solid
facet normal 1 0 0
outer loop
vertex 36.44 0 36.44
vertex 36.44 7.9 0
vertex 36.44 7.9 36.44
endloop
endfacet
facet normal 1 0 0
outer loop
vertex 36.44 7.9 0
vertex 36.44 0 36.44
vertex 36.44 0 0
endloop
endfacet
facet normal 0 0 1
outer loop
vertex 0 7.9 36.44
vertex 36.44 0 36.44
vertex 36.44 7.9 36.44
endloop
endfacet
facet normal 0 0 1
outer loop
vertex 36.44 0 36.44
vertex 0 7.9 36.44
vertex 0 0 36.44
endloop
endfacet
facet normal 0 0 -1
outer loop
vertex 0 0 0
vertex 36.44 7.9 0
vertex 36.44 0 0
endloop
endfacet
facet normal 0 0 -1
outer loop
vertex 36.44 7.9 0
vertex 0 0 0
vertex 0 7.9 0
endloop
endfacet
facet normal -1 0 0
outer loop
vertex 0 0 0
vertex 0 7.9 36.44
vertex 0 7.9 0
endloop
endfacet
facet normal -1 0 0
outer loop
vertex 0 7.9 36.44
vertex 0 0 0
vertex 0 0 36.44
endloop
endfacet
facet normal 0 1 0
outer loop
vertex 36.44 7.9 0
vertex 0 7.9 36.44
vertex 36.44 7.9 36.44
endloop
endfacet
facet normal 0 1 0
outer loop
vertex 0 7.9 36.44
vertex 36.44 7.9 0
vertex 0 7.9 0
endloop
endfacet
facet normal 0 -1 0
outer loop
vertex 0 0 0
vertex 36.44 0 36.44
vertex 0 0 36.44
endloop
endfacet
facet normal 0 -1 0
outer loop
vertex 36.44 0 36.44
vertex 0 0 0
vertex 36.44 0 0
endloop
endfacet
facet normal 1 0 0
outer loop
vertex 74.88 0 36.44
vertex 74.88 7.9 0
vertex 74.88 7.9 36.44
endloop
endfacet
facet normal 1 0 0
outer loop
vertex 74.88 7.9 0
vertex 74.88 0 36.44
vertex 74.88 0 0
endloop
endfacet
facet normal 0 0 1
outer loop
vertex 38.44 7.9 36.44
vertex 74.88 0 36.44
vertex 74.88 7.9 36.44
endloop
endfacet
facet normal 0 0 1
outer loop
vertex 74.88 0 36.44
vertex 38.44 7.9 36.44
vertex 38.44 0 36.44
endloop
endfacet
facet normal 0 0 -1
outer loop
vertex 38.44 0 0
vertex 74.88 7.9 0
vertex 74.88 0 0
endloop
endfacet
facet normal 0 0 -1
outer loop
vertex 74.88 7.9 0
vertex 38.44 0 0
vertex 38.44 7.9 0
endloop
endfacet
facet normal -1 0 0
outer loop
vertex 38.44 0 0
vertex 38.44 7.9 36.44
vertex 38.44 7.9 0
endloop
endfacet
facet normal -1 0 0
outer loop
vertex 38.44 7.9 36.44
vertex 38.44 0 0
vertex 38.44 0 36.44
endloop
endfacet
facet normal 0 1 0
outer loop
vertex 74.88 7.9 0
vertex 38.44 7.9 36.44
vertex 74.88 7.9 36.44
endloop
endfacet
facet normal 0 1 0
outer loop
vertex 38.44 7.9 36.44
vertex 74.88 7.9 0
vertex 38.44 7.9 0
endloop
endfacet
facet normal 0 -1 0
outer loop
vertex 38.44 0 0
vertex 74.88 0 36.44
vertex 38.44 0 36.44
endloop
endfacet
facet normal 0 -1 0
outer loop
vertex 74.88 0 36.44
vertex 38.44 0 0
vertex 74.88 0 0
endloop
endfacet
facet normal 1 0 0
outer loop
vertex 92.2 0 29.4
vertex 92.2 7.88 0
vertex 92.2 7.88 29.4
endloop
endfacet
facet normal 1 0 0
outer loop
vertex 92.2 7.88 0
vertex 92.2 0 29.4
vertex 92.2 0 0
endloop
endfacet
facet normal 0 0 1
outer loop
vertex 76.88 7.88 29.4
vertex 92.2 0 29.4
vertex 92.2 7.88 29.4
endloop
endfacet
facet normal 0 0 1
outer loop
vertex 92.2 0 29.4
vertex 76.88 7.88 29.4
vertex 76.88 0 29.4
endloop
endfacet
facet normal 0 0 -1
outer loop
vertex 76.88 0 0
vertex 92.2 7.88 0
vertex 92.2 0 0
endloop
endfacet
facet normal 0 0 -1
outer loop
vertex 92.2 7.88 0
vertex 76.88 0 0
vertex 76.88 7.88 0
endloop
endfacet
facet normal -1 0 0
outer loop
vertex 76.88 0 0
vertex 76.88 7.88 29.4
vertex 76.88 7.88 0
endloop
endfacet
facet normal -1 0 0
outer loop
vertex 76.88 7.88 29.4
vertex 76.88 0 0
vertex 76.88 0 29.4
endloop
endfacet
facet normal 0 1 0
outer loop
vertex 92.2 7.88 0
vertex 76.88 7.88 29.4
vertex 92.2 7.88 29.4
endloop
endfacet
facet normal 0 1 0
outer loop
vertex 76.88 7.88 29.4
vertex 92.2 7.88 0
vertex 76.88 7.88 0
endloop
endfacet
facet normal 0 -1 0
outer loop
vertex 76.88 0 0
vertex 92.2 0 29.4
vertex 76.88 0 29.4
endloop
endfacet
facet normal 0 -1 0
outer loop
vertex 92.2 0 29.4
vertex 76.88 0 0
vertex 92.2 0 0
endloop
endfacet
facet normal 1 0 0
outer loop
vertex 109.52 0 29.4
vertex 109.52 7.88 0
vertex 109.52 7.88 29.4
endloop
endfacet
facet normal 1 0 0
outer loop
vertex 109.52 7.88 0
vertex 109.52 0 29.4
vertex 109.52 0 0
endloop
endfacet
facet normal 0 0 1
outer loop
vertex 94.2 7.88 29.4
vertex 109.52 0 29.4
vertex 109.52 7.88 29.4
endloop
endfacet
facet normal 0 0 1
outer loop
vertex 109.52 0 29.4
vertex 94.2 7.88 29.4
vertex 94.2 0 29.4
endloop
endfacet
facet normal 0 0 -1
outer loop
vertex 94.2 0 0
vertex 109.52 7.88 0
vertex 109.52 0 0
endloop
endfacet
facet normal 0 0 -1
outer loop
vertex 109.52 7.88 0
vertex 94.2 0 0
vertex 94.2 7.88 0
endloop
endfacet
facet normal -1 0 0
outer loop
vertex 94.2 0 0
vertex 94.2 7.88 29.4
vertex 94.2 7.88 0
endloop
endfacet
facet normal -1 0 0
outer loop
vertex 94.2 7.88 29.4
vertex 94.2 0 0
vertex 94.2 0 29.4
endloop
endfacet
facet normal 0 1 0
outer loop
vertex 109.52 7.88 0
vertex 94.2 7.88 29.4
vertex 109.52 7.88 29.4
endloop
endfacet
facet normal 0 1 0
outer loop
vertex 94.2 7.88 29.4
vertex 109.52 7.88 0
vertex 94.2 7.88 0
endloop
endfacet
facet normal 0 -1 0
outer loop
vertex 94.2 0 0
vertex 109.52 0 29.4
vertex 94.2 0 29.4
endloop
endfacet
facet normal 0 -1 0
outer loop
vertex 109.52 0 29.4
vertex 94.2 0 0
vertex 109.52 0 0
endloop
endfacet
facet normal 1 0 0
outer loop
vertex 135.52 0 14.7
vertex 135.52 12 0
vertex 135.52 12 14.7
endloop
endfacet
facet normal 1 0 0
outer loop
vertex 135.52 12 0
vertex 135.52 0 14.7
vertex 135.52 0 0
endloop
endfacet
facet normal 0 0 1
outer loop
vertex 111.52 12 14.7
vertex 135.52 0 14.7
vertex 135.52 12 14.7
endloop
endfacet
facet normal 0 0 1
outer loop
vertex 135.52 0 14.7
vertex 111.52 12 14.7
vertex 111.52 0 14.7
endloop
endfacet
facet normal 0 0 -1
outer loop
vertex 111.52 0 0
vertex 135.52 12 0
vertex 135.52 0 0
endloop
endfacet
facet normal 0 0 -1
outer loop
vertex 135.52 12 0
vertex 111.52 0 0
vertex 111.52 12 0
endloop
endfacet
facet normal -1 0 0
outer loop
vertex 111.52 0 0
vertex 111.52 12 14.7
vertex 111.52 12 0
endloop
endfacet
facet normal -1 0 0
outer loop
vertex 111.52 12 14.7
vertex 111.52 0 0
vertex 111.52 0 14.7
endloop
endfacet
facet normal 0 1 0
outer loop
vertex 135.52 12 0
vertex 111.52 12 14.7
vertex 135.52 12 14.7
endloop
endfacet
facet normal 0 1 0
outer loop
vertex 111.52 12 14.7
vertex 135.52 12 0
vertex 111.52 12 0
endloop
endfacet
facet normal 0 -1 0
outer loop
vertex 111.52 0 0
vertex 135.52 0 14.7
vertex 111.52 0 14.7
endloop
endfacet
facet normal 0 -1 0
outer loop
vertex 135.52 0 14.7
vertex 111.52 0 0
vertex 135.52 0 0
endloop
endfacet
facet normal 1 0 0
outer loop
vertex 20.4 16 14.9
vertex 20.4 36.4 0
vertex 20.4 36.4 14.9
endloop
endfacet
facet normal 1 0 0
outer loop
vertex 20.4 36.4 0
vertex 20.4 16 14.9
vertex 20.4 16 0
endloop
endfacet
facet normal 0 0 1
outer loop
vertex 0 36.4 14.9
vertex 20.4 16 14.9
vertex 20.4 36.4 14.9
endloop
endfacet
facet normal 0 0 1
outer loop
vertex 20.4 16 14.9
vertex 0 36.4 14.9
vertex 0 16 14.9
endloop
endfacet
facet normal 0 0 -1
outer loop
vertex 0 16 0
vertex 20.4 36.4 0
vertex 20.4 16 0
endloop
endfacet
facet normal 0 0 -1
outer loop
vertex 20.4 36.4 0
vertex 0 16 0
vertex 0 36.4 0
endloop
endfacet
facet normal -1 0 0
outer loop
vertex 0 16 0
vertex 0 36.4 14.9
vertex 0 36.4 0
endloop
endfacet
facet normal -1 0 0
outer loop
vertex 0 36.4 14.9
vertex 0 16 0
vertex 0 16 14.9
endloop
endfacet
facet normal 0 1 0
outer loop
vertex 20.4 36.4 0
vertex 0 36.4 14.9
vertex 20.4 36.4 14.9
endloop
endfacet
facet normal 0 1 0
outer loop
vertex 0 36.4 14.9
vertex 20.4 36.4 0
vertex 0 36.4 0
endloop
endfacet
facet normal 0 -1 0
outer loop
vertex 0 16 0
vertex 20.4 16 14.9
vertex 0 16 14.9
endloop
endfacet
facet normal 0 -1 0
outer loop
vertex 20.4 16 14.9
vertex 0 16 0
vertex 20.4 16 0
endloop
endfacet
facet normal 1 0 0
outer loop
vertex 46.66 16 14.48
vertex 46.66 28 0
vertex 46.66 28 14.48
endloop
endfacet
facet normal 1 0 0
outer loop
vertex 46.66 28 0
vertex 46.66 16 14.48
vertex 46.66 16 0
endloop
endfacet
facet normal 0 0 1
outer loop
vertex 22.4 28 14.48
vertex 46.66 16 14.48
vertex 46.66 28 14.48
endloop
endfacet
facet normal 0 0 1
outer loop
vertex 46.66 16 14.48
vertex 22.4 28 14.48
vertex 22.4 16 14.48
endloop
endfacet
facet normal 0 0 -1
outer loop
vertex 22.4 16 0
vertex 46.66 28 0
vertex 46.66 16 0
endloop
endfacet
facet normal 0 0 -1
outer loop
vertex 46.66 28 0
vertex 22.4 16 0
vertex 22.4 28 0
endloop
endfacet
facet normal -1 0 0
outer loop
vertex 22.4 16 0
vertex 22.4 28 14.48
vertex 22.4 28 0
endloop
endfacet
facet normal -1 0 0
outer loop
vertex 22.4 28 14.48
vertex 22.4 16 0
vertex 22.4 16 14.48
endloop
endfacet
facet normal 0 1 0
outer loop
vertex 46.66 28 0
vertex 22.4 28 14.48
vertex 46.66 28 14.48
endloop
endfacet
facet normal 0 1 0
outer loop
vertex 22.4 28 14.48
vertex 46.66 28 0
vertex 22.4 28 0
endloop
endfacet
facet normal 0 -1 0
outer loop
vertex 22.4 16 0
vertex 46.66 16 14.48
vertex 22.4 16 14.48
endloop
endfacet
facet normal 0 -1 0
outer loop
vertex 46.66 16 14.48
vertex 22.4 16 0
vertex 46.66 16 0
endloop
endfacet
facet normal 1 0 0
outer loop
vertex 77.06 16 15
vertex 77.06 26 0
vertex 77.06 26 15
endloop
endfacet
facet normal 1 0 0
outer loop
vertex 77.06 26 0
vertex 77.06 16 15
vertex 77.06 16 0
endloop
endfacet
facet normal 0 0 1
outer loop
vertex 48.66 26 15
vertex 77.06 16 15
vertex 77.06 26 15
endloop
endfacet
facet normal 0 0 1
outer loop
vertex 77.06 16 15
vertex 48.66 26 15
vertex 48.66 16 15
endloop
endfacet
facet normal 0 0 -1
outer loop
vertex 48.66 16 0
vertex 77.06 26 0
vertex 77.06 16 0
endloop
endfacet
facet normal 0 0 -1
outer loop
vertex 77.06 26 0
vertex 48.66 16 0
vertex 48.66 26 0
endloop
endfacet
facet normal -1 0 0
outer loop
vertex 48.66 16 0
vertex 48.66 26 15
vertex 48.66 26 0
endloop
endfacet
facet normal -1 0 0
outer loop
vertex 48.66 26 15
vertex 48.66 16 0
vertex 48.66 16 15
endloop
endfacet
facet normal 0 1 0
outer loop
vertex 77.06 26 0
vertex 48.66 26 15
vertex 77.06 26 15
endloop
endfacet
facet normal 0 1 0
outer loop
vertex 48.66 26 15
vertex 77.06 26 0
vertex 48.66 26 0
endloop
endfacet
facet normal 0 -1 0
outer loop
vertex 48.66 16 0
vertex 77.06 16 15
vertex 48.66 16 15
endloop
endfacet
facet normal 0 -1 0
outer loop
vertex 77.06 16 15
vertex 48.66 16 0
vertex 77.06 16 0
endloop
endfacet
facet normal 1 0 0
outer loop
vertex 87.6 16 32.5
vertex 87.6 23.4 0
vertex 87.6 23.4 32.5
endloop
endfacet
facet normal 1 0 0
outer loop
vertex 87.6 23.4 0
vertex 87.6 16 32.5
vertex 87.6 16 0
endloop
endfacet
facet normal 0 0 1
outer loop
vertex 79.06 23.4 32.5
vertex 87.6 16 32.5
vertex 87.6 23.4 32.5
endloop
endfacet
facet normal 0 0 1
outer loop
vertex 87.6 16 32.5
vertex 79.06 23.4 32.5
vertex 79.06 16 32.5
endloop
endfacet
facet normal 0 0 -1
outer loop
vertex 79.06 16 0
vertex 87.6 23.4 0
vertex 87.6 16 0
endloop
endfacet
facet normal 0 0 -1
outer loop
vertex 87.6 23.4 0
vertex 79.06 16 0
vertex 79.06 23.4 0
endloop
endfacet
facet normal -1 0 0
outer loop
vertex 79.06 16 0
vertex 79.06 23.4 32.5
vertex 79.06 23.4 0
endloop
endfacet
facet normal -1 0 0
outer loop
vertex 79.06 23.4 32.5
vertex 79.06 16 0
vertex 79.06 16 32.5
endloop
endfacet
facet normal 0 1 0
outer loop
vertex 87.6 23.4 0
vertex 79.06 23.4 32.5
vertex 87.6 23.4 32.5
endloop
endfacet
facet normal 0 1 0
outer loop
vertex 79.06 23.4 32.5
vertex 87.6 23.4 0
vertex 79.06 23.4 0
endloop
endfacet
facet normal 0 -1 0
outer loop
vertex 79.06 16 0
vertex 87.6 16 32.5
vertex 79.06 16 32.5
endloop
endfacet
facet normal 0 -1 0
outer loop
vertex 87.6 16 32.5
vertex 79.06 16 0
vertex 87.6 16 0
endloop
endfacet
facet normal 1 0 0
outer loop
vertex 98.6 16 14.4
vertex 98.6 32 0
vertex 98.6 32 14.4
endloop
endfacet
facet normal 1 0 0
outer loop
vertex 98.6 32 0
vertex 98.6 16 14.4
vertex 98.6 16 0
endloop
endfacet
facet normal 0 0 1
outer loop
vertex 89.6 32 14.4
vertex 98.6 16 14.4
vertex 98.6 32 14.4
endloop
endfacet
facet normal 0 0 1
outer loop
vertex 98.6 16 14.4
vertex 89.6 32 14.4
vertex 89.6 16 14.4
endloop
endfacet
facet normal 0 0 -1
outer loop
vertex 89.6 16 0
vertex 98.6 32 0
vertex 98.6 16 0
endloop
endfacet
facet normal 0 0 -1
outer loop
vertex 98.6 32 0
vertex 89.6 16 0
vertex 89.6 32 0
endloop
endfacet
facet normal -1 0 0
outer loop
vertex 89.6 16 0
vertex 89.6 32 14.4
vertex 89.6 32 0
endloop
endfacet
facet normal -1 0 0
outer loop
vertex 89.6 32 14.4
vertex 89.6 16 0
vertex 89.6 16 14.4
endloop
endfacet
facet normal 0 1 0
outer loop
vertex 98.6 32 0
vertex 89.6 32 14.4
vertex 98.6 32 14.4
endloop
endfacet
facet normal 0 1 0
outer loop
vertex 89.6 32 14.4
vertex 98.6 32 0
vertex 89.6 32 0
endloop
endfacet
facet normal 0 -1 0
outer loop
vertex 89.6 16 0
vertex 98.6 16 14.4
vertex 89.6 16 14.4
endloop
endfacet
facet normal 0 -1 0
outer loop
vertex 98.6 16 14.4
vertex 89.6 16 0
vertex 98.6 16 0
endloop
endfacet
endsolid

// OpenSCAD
// file: ../../lib/util/util_functions.scad
function sum(v) = [for(p = v) 1] * v;

// Map to just the given index of a list of arrays
//
// list = [
//   [1, 2],
//   [3, 4],
// ];
// pick_list(list, 0) -> [1, 3]
// pick_list(list, 1) -> [2, 4]
function pick_list(list, index) = [for(i=[0:len(list)-1]) list[i][index]];

// slice an array
// slice([1, 2, 3, 4], 0, 2) => [1, 2, 3]
function slice(array, start, end) = [for(i=[start:end]) array[i]];

// cumulatively sum a list
// [1, 2, 3] -> [1, 3, 6]
function cum_sum_list(list) = [for(i=[0:len(list)-1]) sum(slice(list, 0, i))];

function list_range(list) = [0:len(list)-1];

// add to teach item in a list
// add_to_each([1, 2, 3], 2) -> [3, 4, 5];
function add_to_each(list, add) = [for(item=list) item + add];

// add a value to the start of a list
function unshift(list, value) = 
  assert(is_list(list), list)
  [value, for(item=list) item];

function take_sum(v, i) = i == 0 
  ? 0 
  : sum([for(a=[0:i-1]) v[a]]);

// input : nested list
// output : list with the outer level nesting removed
function flatten(outter_vector) = [for(inner_vector=outter_vector) for(item=inner_vector) item];

module test_window(size, position) {
  intersection() {
    children();
    translate(position) {
      cube(size);
    }
  }
}
// main file
include <../../lib/util/util_functions.scad>

scaleFactor = 0.02;
gap = 100 * scaleFactor;
rowGap = 800 * scaleFactor;

function scaleFurniture(size) = size * scaleFactor;
function scaleFurnitureList(sizes) = [for(size=sizes) scaleFurniture(size)];
function scaleFurnitureGrid(grid) = [for(row=grid) scaleFurnitureList(row)];

module placeFurniture(grid) {
  for (i=[0:len(grid)-1]) {
    let(
      sizes = grid[i]
    ) {
      translate([0, i > 0 ? rowGap: 0, 0]) {
        for (j=[0:len(sizes)-1]) {
          let(
            offset = j == 0 ? 0 : take_sum(pick_list(sizes, 0), j) + (gap * j)
          ) {
            translate([offset, 0, 0]) {
              cube(sizes[j]);
            }
          }
        }
      }
    }
  }
}

kalax_5_x_5 = [1822, 395, 1822];
kalax_2_x_4 = [766, 394, 1470];
lachlan_work_desk = [1200, 600, 735];
bec_work_desk = [1020, 1020, 745];
kids_computer_desk = [1213, 600, 724];
craft_desk = [1420, 500, 750];
dtolf = [427, 370, 1625];
printer_cabinet = [450, 800, 720];

room = [3000, 5900];
offsetToArch = 2510;
arch = 1185;

echo("room: ", room * scaleFactor);
echo("offsetToArch: ", offsetToArch * scaleFactor);
echo("arch: ", arch * scaleFactor);

grid = [
  [
    kalax_5_x_5,
    kalax_5_x_5,
    kalax_2_x_4,
    kalax_2_x_4,
    lachlan_work_desk,
  ],
  [
    bec_work_desk,
    kids_computer_desk,
    craft_desk,
    dtolf,
    printer_cabinet,
  ],
];

placeFurniture(scaleFurnitureGrid(grid));
